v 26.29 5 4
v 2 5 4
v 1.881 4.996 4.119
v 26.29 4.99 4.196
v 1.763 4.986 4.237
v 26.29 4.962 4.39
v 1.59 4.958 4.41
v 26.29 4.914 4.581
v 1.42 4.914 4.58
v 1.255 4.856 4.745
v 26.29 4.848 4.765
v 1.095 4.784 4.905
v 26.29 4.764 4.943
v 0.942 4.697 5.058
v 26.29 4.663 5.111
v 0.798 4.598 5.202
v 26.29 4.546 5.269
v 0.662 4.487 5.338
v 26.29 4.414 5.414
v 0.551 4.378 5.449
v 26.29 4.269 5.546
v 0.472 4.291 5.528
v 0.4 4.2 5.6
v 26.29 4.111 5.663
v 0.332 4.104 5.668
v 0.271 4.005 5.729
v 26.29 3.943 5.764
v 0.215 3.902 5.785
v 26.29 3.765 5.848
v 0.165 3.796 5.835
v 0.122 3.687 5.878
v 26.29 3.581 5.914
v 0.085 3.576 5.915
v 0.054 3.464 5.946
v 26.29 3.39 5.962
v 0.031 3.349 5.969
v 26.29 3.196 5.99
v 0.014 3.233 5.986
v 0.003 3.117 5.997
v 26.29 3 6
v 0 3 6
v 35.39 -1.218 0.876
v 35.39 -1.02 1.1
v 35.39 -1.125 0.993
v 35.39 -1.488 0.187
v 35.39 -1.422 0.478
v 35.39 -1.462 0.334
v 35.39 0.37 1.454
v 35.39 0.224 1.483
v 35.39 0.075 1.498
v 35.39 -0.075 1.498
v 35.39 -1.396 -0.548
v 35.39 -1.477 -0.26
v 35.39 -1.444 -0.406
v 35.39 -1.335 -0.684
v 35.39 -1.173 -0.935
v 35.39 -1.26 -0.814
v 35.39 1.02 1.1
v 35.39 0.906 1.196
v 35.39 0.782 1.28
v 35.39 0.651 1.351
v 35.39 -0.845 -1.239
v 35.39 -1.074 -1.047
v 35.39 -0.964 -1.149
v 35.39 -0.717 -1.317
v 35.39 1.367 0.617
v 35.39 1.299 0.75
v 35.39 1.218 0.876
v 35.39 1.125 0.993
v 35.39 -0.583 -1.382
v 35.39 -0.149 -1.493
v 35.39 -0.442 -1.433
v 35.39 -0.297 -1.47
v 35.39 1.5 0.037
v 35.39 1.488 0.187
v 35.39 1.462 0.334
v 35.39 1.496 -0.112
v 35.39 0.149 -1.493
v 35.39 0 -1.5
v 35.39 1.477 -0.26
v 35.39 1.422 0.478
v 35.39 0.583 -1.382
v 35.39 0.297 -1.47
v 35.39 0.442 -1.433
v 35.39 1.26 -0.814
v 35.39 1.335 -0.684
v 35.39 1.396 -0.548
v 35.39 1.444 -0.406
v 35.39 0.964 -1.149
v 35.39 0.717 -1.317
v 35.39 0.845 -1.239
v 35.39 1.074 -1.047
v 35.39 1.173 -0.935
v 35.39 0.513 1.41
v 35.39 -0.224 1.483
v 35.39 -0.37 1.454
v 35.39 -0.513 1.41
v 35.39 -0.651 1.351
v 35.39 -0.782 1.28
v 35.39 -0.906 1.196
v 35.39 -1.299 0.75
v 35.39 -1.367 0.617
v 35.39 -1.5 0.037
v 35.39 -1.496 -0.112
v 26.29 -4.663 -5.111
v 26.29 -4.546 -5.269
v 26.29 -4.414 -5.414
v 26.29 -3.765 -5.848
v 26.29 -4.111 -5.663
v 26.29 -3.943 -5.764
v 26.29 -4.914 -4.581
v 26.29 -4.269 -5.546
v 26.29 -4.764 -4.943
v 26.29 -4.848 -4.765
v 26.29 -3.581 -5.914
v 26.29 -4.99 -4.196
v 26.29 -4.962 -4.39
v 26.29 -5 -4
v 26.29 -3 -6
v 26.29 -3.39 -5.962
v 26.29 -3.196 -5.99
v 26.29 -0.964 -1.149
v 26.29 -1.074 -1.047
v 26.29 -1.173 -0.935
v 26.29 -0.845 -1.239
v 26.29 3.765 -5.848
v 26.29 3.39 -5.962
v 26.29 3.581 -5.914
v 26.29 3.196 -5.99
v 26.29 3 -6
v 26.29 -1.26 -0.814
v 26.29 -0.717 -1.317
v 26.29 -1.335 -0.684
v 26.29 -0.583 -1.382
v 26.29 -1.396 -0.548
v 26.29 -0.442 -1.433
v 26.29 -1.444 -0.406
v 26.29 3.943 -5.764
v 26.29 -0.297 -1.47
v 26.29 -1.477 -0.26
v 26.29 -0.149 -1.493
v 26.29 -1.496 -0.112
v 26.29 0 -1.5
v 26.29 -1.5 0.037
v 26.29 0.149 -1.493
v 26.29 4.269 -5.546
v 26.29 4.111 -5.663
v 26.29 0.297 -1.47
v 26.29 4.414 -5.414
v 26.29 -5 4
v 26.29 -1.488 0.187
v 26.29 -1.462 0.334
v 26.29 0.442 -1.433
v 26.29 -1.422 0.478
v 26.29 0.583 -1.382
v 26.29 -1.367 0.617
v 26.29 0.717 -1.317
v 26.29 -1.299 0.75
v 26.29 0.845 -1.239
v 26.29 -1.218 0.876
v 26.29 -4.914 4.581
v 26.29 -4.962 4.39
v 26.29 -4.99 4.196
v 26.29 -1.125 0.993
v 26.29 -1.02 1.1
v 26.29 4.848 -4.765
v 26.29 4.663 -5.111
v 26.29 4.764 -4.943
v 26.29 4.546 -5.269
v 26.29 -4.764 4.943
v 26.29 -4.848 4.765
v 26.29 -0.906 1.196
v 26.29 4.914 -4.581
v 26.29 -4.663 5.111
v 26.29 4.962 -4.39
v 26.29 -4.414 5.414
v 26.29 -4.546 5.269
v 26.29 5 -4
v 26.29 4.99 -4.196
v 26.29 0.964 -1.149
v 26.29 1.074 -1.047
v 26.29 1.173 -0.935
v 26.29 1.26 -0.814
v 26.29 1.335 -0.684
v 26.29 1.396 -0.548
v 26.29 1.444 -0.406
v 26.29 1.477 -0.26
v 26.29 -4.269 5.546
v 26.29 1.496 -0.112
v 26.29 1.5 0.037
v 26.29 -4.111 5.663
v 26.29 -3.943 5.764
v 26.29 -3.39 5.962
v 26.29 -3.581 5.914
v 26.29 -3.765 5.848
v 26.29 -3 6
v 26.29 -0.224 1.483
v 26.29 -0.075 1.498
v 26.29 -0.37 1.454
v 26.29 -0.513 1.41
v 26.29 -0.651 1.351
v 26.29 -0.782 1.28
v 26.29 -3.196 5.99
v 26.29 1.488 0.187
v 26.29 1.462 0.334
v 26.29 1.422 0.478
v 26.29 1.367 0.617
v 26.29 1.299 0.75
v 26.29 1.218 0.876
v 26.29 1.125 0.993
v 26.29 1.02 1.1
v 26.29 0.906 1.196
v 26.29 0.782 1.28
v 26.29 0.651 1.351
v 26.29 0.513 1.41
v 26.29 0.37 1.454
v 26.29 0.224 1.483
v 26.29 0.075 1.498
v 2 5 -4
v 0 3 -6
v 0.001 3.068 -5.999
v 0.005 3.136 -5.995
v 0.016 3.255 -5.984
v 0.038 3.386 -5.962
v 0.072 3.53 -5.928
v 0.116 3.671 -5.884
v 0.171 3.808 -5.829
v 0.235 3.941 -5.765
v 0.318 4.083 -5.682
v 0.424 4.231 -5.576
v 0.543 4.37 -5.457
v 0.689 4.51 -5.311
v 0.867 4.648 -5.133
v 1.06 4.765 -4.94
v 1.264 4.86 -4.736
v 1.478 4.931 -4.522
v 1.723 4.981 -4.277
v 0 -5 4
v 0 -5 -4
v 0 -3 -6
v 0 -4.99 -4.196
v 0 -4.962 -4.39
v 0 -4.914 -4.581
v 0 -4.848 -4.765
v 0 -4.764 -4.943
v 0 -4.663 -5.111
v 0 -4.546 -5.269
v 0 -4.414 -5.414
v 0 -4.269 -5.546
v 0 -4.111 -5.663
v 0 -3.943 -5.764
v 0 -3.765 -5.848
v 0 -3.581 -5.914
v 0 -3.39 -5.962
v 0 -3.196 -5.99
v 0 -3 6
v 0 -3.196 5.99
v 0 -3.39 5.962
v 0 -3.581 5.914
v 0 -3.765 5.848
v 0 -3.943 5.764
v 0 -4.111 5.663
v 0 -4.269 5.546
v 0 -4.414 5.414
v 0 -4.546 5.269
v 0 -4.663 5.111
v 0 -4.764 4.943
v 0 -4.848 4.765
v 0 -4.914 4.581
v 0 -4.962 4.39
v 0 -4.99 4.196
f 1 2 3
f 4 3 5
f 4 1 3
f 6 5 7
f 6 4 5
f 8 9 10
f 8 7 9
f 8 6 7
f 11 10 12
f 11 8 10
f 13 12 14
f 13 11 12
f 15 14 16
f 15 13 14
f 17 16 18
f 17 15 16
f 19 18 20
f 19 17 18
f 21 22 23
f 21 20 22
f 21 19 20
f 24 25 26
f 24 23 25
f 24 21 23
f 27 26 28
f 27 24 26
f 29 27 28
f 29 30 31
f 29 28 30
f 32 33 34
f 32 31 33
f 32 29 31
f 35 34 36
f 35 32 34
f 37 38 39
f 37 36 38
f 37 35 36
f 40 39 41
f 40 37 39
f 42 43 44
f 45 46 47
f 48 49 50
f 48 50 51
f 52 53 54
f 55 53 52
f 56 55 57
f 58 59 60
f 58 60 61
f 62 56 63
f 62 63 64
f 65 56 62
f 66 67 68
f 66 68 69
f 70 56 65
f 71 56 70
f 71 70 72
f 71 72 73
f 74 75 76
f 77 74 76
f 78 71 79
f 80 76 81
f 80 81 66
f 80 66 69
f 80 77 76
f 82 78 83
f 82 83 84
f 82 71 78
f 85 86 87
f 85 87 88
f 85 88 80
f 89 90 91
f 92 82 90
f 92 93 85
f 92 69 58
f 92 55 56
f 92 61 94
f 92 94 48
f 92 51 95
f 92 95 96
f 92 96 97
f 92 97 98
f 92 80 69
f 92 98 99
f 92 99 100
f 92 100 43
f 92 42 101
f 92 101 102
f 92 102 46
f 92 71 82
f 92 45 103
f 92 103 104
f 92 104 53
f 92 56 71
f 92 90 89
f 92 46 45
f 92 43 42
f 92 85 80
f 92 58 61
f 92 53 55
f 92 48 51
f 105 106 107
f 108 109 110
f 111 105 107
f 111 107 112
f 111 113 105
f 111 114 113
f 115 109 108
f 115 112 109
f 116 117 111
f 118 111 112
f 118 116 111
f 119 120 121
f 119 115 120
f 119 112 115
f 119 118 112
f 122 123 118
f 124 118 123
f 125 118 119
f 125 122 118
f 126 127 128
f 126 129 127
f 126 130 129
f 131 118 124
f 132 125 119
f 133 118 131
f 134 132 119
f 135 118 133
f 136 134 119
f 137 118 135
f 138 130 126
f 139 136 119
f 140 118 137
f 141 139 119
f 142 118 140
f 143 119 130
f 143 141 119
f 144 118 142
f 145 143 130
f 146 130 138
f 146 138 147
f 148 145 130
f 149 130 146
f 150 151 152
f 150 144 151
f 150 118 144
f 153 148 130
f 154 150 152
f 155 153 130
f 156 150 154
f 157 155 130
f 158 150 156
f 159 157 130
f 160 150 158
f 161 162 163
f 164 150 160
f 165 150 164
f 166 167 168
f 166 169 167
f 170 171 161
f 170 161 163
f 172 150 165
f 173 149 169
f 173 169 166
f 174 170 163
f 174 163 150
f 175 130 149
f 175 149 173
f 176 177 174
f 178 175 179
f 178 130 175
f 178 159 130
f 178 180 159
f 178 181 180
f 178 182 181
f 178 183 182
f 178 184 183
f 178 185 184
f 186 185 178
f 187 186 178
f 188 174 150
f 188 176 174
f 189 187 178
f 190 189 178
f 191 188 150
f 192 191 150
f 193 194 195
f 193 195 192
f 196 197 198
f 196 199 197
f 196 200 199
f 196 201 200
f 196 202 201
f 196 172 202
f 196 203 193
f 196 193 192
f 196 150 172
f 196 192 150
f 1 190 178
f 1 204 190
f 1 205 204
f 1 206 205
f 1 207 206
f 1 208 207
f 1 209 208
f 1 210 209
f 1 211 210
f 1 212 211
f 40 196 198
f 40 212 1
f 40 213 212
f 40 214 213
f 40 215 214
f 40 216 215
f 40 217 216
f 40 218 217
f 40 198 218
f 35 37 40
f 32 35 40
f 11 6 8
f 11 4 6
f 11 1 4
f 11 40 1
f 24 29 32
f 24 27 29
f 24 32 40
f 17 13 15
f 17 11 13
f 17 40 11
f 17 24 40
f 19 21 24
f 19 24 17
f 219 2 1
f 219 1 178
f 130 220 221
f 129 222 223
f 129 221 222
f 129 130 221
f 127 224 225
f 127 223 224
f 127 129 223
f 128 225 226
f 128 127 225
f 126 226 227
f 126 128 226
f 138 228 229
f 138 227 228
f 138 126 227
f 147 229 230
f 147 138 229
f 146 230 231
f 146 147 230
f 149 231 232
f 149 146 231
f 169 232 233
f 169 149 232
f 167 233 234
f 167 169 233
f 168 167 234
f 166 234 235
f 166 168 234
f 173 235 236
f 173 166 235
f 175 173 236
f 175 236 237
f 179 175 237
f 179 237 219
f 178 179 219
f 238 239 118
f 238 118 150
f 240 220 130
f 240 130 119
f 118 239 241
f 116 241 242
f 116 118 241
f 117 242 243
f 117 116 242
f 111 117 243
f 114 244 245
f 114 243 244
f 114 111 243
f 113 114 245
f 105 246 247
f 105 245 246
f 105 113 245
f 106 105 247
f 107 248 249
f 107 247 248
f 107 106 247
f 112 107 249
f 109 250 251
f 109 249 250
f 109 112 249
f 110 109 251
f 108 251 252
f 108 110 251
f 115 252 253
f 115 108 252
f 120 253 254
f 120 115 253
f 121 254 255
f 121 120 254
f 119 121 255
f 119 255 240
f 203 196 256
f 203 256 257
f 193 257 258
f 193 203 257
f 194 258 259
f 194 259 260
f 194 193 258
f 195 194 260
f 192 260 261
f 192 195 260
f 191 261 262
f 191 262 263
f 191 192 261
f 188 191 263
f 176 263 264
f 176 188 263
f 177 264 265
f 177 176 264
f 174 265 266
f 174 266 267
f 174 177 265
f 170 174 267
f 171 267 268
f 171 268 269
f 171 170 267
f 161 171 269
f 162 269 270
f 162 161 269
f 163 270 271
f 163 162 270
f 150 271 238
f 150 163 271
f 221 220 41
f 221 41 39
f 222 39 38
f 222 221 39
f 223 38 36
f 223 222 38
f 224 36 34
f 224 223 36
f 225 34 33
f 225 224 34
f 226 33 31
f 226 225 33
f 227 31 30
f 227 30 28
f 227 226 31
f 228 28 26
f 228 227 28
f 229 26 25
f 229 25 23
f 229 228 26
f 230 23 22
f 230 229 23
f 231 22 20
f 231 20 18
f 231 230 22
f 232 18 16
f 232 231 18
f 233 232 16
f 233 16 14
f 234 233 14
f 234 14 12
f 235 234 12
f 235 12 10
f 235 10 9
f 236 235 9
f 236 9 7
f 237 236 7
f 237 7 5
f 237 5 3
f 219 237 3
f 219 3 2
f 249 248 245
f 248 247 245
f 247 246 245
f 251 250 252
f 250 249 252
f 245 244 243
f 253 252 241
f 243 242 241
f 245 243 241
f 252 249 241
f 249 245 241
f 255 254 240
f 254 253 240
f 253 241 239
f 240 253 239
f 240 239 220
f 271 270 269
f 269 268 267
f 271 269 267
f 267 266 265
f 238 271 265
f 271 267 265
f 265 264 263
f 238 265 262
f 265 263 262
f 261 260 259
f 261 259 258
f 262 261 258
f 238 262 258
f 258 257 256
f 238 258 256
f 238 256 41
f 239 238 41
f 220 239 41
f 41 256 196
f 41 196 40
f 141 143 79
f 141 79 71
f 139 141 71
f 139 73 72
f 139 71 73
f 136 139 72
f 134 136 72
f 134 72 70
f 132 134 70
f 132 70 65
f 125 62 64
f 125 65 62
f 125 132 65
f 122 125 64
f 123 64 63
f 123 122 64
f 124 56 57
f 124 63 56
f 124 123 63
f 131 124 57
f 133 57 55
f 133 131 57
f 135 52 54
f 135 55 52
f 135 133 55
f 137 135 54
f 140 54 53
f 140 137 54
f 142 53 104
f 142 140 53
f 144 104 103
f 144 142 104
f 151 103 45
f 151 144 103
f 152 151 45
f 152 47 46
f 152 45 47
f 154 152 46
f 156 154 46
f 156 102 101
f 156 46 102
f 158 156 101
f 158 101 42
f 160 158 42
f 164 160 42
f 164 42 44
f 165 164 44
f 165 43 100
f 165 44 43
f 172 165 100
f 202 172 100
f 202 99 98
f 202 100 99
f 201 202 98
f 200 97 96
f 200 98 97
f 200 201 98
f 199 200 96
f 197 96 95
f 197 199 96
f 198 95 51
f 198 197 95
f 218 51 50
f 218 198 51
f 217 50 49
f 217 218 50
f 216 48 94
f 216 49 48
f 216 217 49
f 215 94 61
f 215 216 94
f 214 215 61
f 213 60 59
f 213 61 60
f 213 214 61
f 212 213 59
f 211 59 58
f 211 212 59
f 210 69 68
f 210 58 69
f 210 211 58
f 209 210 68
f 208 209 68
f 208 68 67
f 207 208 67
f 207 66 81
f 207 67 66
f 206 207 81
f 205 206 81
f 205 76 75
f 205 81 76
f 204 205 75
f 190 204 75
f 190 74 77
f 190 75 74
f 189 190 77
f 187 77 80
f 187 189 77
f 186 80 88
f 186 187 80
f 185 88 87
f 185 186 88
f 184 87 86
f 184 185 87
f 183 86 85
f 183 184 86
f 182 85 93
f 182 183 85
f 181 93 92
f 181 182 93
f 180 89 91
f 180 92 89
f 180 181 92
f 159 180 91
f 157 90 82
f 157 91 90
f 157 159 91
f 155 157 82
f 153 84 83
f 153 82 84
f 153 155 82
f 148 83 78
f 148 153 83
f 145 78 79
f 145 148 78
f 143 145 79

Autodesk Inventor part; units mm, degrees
ref_plane "YZ Plane" through (0, 0, 0) normal (1, 0, 0) x (0, 1, 0)
ref_plane "XZ Plane" through (0, 0, 0) normal (0, 1, 0) x (-1, 0, 0)
ref_plane "XY Plane" through (0, 0, 0) normal (0, 0, 1) x (1, 0, 0)
sketch "Sketch1" plane through (0, 0, 0) normal (1, 0, 0) x (0, 1, 0)
  line L0 (-5, 6) -> (5, 6)
  line L1 (5, 6) -> (5, -6)
  line L2 (5, -6) -> (-5, -6)
  line L3 (-5, -6) -> (-5, 6)
  line L4 (-5, 6) -> (5, -6) construction
  line L5 (5, 6) -> (-5, -6) construction
  point P0 (0, 0)
  dimension "d0" = 10
  dimension "d1" = 12
extrude "Extrusion1" add sketch "Sketch1" along normal blind 26.29
sketch "Sketch2" plane through (26.29, 0, 0) normal (1, 0, 0) x (0, 0, -1)
  circle A0 centre (0, 0) radius 1.5
  dimension "d4" = 3
fillet "Fillet1" radius 2 5 edges at (13.145, 5, 6) (13.145, 5, -6) (13.145, -5, 6) (13.145, -5, -6) (0, 5, 0)
extrude "Extrusion2" add sketch "Sketch2" along normal blind 9.1
properties part number "motor" material "Aluminum 6061"
